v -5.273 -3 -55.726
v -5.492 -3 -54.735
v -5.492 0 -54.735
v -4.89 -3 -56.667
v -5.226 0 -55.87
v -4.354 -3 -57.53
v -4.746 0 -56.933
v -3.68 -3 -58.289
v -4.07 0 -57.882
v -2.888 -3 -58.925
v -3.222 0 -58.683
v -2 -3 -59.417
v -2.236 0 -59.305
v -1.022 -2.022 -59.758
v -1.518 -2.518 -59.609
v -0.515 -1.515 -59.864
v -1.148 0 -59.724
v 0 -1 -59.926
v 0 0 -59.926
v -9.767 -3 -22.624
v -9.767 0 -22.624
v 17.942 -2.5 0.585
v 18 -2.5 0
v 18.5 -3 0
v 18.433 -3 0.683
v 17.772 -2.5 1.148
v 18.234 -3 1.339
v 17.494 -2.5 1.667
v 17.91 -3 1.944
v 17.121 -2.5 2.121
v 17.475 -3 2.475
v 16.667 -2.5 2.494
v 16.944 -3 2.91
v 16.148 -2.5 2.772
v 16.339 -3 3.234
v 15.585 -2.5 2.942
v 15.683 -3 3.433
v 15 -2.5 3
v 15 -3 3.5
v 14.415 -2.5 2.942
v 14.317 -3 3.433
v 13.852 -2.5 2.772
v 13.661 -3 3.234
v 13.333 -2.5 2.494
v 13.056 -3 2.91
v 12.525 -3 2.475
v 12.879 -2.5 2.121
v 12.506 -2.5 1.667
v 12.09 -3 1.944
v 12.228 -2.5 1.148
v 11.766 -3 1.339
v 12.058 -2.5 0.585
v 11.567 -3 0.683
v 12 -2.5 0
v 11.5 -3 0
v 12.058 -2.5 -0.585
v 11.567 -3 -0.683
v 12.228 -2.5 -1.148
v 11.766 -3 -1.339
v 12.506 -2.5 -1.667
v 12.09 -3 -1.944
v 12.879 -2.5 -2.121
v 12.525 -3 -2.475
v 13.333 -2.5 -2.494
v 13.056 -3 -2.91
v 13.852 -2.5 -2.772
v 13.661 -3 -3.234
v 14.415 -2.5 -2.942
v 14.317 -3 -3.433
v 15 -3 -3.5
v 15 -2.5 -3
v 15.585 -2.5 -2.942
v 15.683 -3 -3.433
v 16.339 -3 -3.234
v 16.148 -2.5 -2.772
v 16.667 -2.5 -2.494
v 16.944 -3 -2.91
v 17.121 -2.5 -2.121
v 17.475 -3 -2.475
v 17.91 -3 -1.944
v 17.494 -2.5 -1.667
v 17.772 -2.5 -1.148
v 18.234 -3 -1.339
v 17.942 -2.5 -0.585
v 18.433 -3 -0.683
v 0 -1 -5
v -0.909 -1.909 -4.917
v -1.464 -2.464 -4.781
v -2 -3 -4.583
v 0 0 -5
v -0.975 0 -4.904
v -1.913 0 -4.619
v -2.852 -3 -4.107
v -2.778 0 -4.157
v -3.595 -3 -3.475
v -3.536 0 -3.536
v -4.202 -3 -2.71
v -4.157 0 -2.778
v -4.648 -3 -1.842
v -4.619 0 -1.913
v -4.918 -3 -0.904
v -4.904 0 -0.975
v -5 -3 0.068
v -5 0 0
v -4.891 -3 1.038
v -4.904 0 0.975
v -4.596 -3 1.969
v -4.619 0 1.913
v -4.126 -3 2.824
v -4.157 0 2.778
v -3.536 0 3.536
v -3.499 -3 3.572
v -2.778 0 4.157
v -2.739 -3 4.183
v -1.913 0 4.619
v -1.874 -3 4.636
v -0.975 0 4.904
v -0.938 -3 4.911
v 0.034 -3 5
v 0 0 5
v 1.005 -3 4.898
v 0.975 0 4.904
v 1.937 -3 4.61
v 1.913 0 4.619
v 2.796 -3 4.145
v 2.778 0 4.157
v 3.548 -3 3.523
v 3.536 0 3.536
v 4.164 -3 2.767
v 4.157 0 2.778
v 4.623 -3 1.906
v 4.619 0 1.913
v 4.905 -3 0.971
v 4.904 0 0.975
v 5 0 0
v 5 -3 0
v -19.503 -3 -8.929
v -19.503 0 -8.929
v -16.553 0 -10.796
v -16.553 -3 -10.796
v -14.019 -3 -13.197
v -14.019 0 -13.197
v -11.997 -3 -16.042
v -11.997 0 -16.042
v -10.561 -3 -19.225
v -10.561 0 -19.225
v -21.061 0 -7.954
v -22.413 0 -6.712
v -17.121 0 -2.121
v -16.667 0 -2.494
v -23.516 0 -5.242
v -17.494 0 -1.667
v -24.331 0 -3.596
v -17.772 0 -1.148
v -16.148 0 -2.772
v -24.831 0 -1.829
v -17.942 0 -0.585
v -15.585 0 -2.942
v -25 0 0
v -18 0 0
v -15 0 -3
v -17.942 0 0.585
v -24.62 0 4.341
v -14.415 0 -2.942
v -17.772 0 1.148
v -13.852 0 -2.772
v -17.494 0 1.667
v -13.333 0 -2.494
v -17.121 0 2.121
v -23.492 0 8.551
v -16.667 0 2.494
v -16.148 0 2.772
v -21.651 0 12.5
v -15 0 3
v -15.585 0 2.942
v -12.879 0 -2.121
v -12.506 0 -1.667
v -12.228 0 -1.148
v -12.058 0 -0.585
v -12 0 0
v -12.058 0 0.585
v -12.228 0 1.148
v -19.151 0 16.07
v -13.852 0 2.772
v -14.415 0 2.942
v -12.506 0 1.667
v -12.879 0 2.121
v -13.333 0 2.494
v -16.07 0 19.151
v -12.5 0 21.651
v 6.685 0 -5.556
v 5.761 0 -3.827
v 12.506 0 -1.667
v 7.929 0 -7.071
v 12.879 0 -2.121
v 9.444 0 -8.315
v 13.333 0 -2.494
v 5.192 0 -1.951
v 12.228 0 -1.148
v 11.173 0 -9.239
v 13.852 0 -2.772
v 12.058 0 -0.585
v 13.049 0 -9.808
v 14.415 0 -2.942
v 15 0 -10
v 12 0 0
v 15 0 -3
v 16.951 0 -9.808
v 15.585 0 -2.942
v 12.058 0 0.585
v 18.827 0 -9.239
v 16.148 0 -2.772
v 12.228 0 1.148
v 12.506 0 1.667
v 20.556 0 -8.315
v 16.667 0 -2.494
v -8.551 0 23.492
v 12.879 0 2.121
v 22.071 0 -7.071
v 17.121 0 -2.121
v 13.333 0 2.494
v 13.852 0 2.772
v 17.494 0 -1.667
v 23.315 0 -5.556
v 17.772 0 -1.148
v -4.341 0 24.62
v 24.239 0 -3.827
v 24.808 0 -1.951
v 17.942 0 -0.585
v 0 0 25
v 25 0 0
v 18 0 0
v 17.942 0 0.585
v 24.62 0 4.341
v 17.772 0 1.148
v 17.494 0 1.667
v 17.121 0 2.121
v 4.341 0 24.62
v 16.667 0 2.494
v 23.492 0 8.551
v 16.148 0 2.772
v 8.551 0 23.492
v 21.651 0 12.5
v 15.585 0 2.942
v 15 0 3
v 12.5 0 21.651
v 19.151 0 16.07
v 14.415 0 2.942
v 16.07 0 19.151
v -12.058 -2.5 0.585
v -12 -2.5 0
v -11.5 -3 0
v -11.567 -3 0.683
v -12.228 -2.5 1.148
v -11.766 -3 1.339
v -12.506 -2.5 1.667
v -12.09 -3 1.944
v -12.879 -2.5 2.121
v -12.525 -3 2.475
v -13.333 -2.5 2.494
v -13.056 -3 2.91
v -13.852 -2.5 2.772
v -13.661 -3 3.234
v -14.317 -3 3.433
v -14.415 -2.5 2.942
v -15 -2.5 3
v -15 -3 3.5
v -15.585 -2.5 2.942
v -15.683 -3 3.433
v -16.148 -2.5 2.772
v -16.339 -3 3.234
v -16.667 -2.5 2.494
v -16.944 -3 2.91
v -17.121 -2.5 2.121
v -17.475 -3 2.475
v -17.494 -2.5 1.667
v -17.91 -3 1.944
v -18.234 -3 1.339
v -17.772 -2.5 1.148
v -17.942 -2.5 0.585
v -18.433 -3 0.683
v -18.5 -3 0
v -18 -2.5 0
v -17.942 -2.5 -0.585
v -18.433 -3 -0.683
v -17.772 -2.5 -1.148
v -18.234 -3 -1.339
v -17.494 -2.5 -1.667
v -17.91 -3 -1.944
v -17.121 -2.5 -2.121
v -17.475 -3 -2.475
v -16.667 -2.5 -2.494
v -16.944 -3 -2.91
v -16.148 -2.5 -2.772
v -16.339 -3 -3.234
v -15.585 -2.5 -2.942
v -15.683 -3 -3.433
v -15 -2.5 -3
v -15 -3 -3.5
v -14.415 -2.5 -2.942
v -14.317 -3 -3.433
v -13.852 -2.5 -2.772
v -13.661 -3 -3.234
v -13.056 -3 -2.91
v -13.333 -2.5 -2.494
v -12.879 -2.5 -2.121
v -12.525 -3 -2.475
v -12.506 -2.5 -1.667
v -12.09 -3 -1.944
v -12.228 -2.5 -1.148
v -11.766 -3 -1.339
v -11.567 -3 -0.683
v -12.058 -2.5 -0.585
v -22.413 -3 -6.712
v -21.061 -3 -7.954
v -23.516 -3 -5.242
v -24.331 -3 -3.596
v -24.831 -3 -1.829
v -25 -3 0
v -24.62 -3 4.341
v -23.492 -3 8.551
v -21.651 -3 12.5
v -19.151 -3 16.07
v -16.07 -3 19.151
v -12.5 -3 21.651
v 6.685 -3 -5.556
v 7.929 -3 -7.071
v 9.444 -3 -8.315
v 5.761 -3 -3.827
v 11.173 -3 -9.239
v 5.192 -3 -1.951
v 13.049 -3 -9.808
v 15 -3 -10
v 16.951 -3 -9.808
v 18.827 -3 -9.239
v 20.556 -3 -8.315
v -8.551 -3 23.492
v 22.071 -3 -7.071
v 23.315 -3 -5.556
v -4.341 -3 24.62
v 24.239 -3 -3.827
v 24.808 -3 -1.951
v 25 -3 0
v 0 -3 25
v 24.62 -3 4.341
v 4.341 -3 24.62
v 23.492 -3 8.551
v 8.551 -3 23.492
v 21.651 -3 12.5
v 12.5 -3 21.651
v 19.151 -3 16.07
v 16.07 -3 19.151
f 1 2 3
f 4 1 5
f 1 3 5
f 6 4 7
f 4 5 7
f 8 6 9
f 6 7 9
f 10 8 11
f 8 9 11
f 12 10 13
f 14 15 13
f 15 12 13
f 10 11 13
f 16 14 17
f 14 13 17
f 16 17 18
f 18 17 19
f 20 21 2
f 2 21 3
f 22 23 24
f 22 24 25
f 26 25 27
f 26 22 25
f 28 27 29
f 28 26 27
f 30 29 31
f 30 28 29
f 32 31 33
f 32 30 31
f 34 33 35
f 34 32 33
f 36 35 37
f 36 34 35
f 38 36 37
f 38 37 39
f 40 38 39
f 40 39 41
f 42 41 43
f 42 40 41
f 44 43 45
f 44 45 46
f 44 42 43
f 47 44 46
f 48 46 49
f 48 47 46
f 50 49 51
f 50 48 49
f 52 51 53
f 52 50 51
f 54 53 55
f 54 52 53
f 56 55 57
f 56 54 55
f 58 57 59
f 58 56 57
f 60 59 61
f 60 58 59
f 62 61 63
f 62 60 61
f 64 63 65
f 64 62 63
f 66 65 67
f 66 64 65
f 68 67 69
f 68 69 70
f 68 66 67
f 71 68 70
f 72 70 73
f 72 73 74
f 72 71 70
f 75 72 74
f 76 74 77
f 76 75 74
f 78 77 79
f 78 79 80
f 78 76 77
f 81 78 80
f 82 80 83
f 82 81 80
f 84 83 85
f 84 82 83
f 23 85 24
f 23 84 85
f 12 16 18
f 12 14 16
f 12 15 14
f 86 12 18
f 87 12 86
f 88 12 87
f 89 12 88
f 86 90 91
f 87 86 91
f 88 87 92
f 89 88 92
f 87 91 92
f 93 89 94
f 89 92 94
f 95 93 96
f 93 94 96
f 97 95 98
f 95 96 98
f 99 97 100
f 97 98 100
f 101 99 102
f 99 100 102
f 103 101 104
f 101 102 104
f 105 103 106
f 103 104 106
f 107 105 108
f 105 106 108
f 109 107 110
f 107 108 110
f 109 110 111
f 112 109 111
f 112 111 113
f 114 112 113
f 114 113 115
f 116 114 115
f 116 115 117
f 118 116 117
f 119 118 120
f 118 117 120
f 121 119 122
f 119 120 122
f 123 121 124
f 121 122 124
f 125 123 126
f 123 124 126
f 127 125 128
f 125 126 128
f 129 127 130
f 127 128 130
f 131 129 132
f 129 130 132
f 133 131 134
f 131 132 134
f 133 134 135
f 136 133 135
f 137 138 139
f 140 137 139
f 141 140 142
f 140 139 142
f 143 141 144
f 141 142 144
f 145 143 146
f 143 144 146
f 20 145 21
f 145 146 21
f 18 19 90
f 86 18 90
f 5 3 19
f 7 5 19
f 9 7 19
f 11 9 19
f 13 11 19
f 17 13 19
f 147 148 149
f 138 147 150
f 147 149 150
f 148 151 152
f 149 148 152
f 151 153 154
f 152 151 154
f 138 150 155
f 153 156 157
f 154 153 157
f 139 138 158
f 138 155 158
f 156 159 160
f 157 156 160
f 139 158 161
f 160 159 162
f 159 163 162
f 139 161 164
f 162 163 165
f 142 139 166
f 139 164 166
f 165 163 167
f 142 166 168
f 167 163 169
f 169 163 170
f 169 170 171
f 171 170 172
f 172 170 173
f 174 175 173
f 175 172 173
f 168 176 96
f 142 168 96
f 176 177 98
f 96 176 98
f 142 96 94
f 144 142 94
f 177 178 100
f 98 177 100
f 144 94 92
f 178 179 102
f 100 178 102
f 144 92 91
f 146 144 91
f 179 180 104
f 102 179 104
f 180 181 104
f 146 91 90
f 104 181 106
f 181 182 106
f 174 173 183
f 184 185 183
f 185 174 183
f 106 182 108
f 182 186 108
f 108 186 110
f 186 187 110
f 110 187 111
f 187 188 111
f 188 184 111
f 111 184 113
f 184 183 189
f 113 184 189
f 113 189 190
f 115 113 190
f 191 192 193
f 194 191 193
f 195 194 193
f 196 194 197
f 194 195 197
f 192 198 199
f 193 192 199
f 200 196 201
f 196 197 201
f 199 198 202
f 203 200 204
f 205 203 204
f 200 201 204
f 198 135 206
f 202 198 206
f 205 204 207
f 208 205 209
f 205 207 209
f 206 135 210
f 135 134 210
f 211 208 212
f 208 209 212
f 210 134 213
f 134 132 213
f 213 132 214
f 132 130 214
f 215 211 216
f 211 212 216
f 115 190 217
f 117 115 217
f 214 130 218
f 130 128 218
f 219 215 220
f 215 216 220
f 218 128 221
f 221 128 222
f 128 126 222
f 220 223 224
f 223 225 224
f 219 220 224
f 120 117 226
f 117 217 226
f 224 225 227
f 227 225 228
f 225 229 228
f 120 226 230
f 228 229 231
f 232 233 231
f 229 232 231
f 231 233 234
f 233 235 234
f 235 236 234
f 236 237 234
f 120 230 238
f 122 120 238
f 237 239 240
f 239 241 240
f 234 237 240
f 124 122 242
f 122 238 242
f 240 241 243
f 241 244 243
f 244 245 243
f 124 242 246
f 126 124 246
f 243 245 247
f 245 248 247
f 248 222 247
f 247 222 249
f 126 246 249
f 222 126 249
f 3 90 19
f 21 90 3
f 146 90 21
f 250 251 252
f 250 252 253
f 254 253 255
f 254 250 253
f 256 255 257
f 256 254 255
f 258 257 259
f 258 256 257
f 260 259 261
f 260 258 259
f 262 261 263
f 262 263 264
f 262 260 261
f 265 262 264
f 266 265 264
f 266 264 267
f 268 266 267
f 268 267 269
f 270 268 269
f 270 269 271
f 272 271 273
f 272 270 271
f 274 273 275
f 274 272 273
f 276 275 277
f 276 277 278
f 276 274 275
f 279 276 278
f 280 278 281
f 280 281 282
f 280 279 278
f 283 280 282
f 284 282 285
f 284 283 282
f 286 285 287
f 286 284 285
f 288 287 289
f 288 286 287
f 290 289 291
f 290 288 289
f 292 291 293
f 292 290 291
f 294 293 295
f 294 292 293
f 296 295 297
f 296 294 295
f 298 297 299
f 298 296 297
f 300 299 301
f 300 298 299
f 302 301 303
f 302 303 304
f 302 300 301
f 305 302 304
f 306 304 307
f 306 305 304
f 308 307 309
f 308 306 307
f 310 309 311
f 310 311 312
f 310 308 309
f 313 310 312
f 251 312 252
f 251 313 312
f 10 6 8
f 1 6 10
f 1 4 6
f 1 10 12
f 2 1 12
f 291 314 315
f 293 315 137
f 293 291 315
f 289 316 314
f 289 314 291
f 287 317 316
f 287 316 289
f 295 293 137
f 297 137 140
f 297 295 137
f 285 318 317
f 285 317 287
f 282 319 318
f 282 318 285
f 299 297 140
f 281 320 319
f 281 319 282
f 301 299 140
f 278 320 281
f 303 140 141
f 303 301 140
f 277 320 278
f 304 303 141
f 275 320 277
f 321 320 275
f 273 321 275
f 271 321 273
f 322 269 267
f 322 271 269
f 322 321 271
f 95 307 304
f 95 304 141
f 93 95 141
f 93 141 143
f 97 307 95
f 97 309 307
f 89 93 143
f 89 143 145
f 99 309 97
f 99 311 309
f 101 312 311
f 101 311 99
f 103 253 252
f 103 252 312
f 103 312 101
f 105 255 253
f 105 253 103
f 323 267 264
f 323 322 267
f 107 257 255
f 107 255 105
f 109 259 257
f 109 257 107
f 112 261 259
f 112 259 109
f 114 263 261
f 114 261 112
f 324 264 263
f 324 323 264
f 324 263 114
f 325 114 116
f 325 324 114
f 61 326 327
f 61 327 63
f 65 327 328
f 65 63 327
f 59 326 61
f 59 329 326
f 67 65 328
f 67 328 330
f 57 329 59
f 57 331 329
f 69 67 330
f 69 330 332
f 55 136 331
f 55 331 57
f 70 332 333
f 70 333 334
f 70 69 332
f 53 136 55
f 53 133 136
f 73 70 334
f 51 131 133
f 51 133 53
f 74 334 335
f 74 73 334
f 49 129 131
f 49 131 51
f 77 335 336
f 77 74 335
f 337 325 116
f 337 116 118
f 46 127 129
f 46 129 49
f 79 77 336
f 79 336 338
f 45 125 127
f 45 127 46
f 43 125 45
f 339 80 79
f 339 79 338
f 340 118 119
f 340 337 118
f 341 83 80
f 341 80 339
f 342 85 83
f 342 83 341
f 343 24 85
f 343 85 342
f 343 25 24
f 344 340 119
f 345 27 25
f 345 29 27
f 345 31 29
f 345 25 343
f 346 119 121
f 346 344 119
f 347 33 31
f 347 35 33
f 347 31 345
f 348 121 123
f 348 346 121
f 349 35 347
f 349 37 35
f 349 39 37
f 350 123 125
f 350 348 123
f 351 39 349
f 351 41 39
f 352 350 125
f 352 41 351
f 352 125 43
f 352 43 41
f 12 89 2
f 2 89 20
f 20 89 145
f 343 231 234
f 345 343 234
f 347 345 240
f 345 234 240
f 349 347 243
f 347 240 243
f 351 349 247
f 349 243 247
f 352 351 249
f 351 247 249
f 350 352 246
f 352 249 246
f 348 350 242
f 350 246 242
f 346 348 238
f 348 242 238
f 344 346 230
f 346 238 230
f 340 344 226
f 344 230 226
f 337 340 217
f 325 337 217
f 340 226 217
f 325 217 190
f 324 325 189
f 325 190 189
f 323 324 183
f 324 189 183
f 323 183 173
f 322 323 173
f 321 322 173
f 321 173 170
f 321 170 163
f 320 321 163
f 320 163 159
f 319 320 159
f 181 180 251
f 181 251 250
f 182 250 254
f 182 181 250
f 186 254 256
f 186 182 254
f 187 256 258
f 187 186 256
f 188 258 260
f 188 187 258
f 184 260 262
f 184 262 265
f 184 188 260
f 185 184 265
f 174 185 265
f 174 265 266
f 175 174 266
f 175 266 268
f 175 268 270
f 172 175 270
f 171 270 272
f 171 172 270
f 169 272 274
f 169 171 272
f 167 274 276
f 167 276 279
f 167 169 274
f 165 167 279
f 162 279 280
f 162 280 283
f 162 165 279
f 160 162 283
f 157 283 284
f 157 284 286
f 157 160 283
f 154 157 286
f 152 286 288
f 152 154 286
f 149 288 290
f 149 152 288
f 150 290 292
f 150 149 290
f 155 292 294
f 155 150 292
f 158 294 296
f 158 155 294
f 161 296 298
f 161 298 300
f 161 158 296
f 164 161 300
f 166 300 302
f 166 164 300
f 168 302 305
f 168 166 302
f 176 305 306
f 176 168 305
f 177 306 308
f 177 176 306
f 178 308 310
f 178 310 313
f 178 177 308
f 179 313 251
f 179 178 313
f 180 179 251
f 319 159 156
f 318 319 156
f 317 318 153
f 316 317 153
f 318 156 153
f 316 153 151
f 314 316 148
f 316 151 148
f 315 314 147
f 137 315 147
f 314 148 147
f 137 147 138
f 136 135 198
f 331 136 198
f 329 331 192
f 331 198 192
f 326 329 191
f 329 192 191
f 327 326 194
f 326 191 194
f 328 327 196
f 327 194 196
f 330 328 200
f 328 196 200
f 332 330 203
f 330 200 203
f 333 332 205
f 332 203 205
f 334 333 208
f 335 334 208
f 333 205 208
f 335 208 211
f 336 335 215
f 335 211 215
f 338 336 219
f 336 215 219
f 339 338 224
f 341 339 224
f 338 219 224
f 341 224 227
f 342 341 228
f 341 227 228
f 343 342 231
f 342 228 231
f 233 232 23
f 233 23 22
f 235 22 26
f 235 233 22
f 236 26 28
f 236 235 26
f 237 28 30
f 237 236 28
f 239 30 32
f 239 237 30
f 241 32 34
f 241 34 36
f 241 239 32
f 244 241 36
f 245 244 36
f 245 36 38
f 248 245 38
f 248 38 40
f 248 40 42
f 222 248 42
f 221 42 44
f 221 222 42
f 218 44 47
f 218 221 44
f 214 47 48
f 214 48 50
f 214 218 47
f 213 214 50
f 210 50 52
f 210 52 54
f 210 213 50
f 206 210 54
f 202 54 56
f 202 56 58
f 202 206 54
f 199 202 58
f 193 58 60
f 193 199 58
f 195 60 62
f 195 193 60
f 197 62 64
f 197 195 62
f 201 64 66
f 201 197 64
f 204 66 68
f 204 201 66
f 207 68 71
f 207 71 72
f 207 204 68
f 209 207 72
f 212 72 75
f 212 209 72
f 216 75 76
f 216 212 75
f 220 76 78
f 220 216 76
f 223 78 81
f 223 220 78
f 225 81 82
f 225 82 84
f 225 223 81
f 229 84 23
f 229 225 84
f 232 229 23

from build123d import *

# Parameters (mm, degrees)
F0_R     = 3
F1_DEPTH = 3
F2_SIZE  = 2
F3_SIZE  = 0.5
F4_SIZE  = 0.5


with BuildPart() as f1:
    # F0 (on Front) → F1 (new body)
    with BuildSketch(Plane.XZ):
        with BuildLine():
            ThreePointArc((5, 0), (15, -10), (25, 0))
            ThreePointArc((25, 0), (0, 25), (-25, 0))
            ThreePointArc((-25, 0), (-23.515691, -5.242423), (-19.5034, -8.928571))
            ThreePointArc((-19.5034, -8.928571), (-12.938924, -14.570541), (-9.766986, -22.624297))
            Line((-9.766986, -22.624297), (-5.491523, -54.734824))
            ThreePointArc((-5.491523, -54.734824), (-3.665561, -58.303294), (0, -59.925571))
            Line((0, -59.925571), (0, -5))
            ThreePointArc((0, -5), (-3.535534, 3.535534), (5, 0))
        make_face()
        with Locations((-15, 0)):
            Circle(F0_R, mode=Mode.SUBTRACT)
        with Locations((15, 0)):
            Circle(F0_R, mode=Mode.SUBTRACT)
    extrude(amount=F1_DEPTH)

    # F2
    f2_edges = [f1.edges().sort_by_distance(p)[0] for p in [
        (0, -3, -32.462785),
    ]]
    chamfer(f2_edges, length=F2_SIZE)

    # F3
    f3_edges = [f1.edges().sort_by_distance(p)[0] for p in [
        (-18, -3, 0),
    ]]
    chamfer(f3_edges, length=F3_SIZE)

    # F4
    f4_edges = [f1.edges().sort_by_distance(p)[0] for p in [
        (12, -3, 0),
    ]]
    chamfer(f4_edges, length=F4_SIZE)


solid = f1.part
